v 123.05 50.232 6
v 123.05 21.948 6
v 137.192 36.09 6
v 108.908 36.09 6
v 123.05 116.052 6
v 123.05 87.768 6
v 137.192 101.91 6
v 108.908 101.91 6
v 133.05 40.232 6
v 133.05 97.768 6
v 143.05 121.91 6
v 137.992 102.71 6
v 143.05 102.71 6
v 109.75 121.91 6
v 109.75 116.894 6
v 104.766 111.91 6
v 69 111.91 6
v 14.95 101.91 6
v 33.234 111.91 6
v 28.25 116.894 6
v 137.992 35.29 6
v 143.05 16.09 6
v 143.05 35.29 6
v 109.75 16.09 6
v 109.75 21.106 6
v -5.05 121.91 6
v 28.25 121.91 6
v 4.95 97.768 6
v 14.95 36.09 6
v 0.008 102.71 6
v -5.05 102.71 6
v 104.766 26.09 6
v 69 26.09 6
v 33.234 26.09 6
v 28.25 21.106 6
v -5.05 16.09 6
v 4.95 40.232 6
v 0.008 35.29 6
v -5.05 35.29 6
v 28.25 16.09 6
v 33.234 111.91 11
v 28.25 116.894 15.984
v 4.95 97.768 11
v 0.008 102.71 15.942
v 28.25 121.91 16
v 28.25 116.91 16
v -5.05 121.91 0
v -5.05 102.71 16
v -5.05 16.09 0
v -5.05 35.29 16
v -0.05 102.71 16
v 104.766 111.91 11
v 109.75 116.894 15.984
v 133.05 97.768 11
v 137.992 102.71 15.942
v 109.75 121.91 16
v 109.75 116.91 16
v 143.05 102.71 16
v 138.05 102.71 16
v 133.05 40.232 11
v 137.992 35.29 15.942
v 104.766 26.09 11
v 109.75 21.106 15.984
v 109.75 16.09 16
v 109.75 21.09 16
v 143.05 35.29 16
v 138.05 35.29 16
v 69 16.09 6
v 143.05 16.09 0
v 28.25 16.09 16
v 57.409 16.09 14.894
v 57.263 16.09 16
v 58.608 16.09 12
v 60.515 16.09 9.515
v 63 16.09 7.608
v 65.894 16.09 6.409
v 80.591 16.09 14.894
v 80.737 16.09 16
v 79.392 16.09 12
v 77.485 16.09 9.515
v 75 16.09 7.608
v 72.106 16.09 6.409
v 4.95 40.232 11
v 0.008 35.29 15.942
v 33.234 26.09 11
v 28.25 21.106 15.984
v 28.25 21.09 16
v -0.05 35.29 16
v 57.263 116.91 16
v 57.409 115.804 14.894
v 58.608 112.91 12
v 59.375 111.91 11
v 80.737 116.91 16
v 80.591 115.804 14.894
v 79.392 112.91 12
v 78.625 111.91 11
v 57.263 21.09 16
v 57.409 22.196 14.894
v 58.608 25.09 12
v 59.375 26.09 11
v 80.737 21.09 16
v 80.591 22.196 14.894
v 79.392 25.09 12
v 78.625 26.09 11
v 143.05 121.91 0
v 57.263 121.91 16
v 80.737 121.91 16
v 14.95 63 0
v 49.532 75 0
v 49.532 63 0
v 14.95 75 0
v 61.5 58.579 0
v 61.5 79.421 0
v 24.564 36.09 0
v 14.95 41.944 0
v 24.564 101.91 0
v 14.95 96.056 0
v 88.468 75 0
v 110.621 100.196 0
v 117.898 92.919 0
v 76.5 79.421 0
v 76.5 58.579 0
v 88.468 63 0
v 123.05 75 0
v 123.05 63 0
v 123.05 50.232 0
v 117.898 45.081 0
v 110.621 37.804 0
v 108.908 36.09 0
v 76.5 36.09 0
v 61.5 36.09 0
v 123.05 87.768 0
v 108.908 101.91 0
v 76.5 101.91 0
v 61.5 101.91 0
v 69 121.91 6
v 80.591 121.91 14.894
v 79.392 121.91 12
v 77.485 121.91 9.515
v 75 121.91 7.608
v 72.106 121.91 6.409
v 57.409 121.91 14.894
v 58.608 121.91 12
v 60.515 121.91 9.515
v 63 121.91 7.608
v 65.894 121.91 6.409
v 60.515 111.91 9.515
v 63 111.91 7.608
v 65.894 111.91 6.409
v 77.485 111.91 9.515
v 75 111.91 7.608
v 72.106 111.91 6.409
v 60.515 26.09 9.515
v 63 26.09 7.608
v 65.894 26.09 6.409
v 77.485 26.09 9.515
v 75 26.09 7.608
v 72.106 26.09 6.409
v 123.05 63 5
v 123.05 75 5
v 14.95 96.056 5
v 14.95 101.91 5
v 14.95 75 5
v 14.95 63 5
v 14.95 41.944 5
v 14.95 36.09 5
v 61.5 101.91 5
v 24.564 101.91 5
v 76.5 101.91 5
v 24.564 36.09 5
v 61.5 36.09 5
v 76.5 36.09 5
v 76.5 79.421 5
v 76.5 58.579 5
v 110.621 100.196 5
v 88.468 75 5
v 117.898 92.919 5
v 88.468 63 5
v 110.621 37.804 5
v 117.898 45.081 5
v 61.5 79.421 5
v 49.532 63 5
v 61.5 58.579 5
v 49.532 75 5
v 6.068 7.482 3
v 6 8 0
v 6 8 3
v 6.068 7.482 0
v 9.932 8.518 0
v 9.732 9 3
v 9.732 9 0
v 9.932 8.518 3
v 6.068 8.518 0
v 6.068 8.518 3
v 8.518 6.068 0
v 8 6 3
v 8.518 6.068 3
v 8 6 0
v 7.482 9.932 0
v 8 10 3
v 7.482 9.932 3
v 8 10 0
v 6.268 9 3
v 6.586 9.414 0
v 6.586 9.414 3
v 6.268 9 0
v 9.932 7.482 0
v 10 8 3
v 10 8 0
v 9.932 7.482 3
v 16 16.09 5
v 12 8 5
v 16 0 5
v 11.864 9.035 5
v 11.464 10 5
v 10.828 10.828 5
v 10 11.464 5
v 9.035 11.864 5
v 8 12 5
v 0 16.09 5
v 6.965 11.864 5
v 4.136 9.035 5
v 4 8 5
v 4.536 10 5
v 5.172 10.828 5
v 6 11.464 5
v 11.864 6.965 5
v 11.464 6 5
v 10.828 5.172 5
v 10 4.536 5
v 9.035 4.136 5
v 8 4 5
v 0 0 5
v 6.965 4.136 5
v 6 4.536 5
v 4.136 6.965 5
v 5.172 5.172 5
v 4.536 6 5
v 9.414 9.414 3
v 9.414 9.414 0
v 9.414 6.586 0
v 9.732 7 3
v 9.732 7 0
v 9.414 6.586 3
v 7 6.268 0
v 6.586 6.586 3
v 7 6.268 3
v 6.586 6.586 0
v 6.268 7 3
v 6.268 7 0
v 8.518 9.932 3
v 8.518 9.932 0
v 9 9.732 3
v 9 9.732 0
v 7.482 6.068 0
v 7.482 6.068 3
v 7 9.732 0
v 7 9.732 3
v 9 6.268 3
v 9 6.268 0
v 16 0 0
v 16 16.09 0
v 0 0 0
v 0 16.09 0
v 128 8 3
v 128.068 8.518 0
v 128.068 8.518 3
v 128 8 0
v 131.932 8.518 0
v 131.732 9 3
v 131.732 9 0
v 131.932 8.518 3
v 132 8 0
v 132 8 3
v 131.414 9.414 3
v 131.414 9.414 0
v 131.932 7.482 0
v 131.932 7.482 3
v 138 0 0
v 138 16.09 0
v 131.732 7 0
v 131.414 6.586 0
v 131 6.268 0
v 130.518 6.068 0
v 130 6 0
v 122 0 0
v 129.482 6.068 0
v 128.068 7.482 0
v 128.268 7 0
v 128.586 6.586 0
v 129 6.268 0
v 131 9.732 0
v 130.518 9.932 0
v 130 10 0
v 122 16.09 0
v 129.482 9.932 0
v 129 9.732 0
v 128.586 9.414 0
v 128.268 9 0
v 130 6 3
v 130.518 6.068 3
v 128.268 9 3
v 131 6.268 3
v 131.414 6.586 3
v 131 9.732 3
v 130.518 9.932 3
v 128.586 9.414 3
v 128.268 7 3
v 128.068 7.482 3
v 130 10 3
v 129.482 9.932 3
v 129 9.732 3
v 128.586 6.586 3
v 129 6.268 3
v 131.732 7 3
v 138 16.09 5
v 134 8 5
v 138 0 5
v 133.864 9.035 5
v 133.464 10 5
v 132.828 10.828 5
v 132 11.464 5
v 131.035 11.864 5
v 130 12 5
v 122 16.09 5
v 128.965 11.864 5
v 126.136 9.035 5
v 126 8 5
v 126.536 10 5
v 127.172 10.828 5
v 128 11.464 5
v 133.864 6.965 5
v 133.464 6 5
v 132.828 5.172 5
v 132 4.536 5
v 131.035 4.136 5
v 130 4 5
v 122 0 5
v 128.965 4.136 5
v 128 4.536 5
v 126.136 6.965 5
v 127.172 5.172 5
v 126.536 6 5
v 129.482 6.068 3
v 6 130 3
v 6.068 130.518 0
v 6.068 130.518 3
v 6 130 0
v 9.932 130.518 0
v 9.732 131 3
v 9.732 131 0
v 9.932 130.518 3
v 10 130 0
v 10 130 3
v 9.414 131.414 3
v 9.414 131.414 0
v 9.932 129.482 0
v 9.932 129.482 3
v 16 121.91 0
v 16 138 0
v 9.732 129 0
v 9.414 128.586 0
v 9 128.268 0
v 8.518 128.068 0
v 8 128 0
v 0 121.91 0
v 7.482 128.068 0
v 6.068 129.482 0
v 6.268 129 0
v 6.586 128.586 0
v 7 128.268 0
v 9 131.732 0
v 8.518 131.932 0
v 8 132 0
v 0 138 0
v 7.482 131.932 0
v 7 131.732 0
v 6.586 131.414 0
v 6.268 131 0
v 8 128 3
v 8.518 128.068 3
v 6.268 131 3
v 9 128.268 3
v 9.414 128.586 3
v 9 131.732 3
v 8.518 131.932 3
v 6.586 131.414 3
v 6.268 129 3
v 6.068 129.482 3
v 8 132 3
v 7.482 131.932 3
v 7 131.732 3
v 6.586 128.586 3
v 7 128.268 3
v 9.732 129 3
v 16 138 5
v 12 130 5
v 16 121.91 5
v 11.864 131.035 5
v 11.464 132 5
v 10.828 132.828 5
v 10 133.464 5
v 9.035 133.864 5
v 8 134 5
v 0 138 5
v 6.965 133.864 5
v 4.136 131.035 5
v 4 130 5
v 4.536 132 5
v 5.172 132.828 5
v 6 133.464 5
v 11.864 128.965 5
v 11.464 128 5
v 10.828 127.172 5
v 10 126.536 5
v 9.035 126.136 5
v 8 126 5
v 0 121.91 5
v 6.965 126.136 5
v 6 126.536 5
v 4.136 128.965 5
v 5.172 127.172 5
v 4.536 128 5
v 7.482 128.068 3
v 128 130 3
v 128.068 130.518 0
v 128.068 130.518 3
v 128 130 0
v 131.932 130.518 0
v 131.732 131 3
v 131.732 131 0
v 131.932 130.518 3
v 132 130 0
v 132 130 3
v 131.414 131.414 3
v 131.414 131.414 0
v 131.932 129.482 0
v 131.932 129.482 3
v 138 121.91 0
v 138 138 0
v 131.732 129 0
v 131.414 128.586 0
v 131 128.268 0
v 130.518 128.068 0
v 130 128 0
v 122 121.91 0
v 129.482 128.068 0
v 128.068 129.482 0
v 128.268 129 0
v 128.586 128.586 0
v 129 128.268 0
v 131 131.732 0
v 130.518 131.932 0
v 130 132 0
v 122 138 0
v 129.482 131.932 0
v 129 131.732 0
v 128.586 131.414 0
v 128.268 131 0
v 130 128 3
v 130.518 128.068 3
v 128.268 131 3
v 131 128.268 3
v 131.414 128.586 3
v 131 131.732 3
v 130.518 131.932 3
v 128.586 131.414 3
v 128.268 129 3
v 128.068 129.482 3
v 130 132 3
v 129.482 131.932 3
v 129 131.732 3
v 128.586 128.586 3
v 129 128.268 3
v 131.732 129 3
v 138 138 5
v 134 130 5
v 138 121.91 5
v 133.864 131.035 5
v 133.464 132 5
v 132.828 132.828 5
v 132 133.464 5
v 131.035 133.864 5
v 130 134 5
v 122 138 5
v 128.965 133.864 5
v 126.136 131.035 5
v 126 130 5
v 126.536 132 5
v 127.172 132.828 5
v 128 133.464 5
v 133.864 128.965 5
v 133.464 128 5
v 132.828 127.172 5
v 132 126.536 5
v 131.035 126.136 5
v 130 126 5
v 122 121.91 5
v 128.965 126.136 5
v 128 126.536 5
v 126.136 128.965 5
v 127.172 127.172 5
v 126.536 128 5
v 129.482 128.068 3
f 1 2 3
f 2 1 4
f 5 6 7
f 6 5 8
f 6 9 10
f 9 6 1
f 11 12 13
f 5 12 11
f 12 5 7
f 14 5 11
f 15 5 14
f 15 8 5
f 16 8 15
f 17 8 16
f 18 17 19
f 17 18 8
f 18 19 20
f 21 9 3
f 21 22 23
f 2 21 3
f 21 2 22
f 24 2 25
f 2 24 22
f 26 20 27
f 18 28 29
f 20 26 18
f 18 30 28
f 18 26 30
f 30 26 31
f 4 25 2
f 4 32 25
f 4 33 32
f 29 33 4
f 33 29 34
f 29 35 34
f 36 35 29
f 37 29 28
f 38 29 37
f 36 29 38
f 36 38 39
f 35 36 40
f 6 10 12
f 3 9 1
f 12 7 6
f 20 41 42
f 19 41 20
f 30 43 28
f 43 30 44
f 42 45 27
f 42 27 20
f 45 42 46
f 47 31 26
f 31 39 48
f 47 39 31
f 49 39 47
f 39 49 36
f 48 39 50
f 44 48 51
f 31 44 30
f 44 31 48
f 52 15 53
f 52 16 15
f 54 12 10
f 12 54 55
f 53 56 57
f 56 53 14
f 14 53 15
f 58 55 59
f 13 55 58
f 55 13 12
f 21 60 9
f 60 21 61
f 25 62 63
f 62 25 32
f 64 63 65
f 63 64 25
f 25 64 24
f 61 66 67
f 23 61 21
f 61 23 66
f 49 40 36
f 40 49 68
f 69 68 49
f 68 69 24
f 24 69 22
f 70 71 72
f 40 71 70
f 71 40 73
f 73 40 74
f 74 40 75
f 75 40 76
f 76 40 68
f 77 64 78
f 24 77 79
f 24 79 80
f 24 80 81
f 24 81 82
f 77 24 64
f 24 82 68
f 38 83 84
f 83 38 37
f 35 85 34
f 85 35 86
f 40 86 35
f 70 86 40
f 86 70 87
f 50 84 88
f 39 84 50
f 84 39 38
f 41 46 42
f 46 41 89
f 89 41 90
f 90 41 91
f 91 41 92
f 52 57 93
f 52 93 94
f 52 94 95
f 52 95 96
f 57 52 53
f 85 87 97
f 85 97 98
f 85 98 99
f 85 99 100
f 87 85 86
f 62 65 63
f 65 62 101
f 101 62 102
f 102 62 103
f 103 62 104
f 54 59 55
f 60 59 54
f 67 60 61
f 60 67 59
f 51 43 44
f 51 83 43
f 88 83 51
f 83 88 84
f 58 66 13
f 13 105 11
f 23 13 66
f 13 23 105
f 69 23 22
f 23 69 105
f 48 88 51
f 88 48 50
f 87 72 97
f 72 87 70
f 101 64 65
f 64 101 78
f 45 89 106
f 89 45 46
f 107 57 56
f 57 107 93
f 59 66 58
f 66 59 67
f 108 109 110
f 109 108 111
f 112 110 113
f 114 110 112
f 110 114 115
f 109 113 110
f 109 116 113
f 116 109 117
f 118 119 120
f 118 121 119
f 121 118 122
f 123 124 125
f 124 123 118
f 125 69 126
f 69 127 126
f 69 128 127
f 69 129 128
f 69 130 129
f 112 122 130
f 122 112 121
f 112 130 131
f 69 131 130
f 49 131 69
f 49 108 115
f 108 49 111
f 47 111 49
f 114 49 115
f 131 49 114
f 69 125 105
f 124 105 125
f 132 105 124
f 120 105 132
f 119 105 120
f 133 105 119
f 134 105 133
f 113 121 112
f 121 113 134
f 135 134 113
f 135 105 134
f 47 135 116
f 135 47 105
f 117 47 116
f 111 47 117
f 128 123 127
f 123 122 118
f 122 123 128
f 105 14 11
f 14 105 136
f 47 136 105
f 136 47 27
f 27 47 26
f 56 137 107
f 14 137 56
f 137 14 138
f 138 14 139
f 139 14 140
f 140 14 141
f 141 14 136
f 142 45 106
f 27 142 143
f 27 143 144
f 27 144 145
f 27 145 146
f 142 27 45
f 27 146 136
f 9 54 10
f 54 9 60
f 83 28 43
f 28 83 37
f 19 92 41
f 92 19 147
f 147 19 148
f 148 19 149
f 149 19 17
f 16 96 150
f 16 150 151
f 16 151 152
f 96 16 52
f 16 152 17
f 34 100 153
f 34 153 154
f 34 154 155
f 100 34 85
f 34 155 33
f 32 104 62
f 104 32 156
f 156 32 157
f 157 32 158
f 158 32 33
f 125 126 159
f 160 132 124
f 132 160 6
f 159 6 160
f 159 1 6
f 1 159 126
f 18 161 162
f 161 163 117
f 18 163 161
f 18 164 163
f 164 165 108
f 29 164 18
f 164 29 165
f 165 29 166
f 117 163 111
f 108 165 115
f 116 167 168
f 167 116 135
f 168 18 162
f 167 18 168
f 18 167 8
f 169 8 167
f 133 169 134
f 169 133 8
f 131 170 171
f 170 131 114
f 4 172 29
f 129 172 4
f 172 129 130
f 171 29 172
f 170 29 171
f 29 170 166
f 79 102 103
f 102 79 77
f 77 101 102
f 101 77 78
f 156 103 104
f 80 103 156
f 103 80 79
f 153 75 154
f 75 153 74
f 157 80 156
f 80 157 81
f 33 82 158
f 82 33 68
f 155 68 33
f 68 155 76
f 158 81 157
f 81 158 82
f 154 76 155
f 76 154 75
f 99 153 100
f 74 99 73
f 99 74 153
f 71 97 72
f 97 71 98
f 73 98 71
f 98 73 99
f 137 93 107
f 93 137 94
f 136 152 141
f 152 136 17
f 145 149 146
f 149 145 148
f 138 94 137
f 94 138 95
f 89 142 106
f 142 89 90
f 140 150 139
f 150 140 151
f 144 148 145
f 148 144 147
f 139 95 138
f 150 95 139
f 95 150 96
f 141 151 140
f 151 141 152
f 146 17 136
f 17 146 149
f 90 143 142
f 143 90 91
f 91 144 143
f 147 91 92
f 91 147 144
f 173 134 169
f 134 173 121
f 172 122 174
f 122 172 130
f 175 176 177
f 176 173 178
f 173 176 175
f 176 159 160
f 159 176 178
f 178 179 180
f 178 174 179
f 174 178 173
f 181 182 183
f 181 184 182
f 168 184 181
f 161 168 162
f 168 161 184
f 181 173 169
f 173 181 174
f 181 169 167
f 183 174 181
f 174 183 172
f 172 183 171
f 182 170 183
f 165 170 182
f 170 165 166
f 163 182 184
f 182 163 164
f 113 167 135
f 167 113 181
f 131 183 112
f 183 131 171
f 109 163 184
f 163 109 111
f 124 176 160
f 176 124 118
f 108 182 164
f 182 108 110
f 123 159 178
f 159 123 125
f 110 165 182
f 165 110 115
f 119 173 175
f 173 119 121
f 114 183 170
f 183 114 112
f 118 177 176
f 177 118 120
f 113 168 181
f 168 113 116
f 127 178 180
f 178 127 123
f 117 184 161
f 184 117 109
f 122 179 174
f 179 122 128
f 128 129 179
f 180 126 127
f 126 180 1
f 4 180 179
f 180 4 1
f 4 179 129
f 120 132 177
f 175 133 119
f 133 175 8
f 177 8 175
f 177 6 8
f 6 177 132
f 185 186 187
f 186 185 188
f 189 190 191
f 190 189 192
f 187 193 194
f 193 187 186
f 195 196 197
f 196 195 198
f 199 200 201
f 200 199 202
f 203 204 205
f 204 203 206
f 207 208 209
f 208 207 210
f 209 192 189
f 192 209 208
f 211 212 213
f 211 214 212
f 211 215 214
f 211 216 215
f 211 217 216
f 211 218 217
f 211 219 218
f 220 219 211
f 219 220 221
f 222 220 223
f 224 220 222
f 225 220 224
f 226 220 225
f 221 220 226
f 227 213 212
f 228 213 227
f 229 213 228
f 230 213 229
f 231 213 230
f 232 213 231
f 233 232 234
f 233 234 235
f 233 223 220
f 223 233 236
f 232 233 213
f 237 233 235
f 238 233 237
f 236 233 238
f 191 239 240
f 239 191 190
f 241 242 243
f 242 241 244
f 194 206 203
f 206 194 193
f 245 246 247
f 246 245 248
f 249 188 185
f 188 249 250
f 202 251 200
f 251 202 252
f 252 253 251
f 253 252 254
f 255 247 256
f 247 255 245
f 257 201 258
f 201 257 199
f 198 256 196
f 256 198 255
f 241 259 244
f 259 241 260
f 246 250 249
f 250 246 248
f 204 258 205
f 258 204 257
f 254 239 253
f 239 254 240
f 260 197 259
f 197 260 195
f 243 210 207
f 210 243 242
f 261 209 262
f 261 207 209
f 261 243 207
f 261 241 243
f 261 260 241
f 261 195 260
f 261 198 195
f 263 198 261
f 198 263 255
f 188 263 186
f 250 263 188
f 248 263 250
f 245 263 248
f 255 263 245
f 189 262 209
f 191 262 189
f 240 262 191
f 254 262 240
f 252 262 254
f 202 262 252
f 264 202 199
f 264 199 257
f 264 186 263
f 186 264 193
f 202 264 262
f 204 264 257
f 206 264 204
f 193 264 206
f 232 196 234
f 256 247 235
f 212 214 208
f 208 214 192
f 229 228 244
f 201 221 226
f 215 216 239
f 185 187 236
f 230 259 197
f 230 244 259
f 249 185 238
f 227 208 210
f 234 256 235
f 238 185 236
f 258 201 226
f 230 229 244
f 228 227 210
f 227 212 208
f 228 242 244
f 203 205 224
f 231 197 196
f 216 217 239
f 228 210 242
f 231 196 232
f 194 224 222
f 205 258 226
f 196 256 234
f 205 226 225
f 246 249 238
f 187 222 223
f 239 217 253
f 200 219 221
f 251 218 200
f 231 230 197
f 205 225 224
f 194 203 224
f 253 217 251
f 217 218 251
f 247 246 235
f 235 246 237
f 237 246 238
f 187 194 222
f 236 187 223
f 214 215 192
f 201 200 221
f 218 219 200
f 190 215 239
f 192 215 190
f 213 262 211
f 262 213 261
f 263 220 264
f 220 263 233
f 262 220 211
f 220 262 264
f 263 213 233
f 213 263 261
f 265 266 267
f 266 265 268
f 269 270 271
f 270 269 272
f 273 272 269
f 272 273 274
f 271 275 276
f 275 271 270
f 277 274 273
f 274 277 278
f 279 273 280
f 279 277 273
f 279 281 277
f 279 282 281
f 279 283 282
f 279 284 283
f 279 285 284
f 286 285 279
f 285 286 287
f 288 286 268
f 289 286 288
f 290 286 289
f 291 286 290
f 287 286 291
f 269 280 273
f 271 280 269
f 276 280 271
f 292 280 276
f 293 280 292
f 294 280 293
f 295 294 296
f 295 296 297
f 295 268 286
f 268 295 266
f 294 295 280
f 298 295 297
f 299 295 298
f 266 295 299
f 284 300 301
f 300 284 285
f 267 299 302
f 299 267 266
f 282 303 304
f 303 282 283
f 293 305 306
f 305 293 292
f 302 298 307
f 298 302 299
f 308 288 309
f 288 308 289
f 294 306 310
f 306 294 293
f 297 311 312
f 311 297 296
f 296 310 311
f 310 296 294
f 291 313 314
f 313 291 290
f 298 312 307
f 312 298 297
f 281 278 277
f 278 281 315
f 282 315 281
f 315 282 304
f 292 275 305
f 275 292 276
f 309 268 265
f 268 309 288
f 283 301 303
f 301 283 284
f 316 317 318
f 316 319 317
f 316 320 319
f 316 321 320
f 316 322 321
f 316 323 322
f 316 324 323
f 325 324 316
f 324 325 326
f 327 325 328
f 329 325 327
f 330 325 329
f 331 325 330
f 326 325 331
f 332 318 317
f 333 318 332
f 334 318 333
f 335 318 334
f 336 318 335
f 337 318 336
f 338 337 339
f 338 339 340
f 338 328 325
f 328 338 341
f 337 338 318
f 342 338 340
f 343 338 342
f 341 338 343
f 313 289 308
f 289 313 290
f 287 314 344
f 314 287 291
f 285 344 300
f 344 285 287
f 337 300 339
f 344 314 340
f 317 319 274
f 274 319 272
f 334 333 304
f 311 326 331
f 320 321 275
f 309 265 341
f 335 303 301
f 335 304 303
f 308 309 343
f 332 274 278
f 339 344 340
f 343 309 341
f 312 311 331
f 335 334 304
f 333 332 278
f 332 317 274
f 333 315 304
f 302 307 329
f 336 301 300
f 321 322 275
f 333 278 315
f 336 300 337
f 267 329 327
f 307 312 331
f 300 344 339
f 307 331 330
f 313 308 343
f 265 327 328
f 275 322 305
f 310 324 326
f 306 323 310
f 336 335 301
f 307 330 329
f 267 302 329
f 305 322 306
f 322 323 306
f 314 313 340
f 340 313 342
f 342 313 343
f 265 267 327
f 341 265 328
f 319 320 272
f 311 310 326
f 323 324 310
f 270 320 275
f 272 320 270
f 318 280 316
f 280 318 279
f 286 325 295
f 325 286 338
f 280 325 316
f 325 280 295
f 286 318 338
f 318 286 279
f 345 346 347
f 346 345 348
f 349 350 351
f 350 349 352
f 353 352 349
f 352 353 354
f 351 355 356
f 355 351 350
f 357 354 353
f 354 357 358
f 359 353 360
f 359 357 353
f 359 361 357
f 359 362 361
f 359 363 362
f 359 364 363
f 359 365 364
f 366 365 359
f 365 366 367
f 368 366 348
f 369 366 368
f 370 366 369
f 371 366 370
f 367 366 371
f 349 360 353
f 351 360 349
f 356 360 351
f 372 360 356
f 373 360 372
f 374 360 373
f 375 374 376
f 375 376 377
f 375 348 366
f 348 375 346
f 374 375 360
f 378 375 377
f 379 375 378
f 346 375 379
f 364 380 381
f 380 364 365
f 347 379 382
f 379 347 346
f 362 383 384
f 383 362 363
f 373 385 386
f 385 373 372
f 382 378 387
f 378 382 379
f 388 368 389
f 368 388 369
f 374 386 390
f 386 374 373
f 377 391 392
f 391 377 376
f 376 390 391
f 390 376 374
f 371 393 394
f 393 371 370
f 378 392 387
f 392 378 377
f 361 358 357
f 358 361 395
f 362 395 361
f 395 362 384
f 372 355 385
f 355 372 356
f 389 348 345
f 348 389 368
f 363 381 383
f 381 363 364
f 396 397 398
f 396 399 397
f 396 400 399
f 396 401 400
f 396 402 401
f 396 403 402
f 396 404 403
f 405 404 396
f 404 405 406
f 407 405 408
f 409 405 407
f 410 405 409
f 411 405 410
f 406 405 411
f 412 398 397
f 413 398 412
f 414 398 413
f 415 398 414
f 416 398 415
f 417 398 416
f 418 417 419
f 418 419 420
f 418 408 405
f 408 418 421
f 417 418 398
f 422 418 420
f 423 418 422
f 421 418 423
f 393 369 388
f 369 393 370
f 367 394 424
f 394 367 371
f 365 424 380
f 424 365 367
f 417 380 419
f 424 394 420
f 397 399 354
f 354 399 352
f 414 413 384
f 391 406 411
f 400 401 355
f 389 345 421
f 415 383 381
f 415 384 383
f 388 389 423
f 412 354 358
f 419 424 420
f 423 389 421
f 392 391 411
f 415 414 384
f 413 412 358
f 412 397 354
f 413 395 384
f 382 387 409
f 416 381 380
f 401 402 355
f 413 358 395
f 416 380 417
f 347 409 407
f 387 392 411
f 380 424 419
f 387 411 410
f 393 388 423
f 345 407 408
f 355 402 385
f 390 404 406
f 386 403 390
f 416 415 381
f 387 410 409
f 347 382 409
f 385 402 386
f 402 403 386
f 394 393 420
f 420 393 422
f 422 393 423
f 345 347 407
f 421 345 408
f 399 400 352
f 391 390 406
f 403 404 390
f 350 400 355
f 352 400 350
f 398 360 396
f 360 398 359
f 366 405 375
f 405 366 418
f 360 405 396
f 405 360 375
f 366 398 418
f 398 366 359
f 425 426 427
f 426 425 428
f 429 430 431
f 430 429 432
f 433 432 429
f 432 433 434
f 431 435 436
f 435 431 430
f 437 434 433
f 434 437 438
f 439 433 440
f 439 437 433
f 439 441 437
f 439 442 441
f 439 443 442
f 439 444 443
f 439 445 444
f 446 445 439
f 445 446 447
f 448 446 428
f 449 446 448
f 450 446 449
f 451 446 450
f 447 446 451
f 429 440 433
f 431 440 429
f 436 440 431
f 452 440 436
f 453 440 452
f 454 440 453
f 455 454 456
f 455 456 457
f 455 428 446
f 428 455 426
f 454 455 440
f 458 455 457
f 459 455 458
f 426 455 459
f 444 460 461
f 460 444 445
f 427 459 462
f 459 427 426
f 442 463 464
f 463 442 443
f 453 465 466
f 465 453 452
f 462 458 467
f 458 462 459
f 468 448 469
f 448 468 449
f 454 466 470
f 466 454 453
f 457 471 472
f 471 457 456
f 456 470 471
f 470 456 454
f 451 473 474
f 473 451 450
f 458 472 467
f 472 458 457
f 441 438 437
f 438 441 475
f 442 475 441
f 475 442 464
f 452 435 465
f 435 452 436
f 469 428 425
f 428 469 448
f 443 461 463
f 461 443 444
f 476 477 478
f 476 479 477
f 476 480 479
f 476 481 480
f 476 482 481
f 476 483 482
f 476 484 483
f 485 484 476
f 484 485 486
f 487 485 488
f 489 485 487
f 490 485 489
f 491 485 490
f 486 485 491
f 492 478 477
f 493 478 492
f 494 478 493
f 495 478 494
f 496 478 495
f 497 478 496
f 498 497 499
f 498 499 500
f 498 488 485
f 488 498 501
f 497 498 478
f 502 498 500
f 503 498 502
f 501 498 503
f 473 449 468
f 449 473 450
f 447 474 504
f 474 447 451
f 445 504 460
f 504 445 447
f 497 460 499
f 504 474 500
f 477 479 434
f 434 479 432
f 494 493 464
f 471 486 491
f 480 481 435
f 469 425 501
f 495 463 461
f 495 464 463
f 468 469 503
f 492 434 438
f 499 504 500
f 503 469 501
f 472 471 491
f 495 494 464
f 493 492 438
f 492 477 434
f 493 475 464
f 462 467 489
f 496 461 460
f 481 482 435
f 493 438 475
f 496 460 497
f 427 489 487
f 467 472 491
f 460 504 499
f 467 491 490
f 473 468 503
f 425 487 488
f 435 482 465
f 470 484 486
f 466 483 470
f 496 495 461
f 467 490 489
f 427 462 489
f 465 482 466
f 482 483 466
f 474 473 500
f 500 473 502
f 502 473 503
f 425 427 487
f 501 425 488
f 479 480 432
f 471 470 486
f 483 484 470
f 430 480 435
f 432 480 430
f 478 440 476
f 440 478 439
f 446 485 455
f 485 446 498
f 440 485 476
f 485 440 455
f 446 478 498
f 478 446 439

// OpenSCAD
$fn = 24;
// parameters (mm)

baseLength = 127.76;            // plate length
baseWidth = 85.48;              // plate width
room = .17;

length = baseLength + room*2;   // indentation length
width = baseWidth + room*2;     // indentation width
height = 10;                    // indentation height


// for specific max dimensions: 
// marginX = ([desiredLength] - length) / 2;
// marginY = ([desiredWidth] - width) / 2;
// marginZ = ([desiredHeight] - height);
marginX = 10;            // wall thickness (length)
marginY = 10;            // wall thickness (width)
marginZ = 6;             // base thickness (height)

// to remove a strut set it to 0
lipWidth = 10;          // lip width
strutA = 15;            // - strut width
strutB = 12;            // | strut width
strutX = 10;            // X struts width
strutZ = 5;             // strut thickness

screwMargin = 8;
screwRad = 2;
screwHeadRad = 4;
screwHeadDepth = 2;
screwDistX = 122;
screwDistY = 122;
plateThickness = 5;

// calculations
fullLength = length + marginX * 2;  // full length
fullWidth = width + marginY * 2;    // full width
fullHeight = height + marginZ;    // full height
cutoutLength = length - lipWidth * 2;  // cutout length
cutoutWidth = width - lipWidth * 2;    // cutout width
// diagonal strut length
strutLength = sqrt(cutoutLength*cutoutLength + cutoutWidth*cutoutWidth);
// screw plate dimensions
plateX = screwMargin * 2;
plateY = (screwMargin + (screwDistY - fullWidth) / 2);
offsetX = (screwMargin + (screwDistX - fullLength) / 2);


// Frame
translate([offsetX, plateY, 0]){
    // well plate (remove for printing)
    /*
    translate([marginX + room, marginY + room, marginZ]){
        cube([127.76, 85.48, 5.5]);
        translate([1.5, 1.5, 0]){
            cube([124.76, 82.48, 14.1]); 
        }
    }
    */
    render() difference(){
        // outside block
        cube([fullLength, fullWidth, fullHeight]);
        // indentation
        translate([marginX, marginY, marginZ]){
            cube([length, width, height]);
        }
        // corner cuts
        translate([0, 0, marginZ]){
            rotate([0, 0, 45]){
                translate([-10, -20, 0]){
                    cube([60, 30, height + 2]);
                }
            }
            cube([33.3, 19.2, height + 2]);
            translate([0, fullWidth, 0]){
                rotate([0, 0, -45]){
                    translate([-10, -10, 0]){
                        cube([60, 30, height + 2]);
                    }
                }
                translate([0, -19.2, 0])
                cube([33.3, 19.2, height + 2]);
            }
            translate([fullLength, fullWidth, 0]){
                rotate([0, 0, 225]){
                    translate([-10, -20, 0]){
                        cube([60, 30, height + 2]);
                    }
                }
                translate([-33.3, -19.2, 0])
                cube([33.3, 19.2, height + 2]);
            }
            translate([fullLength, 0, 0]){
                rotate([0, 0, -225]){
                    translate([-10, -10, 0]){
                        cube([60, 30, height + 2]);
                    }
                }
                translate([-33.3, 0, 0])
                cube([33.3, 19.2, height + 2]);
            }
        }
        // cutout bottom
        translate([marginX + lipWidth, marginY + lipWidth, 0]){
            cube([cutoutLength, cutoutWidth, marginZ]);
        }
        // side holes
        translate([fullLength / 2, 0, fullHeight + 2]){
            rotate([-90, 0, 0]){
            cylinder(h = marginY, r = height + 2);
            }
        }
        translate([fullLength / 2, fullWidth, fullHeight + 2]){
            rotate([90, 0, 0]){
            cylinder(h = marginY, r = height + 2);
            }
        }
        // Bevel
        translate([fullLength / 2, fullWidth / 2, fullHeight+ height/2]){
            intersection(){
                rotate([45, 0, 0]){
                    // along x
                    cube([fullLength, fullWidth/sqrt(2), fullWidth/sqrt(2)], true);
                }
                rotate([0, 45, 0]){
                    // along y
                    cube([fullLength/sqrt(2), fullWidth, fullLength/sqrt(2)], true);
                }
                cube([fullLength, fullWidth, height*2], true);
            }
        }
    }
    
    // Struts
    
    // strutA
    // [   ]
    // [---]
    // [   ].
    translate([(fullLength - strutA) / 2, marginY + lipWidth, 0]){
        cube([strutA, cutoutWidth, strutZ]);
    }

    // strutB
    // [ | ]
    // [ | ]
    // [ | ].
    translate([marginX + lipWidth, (fullWidth - strutB) / 2, 0]){
        cube([cutoutLength, strutB, strutZ]);
    }

    // strutX
    // [\  ]
    // [ \ ]
    // [  \].
    translate([(marginX + lipWidth), (marginY + lipWidth), 0]){
        rotate([0, 0, atan2(cutoutWidth, cutoutLength)]){
            translate([0, -strutX / 2, 0]){
                cube([strutLength, strutX, strutZ]);
            }
        }
    }

    // strutX
    // [  /]
    // [ / ]
    // [/  ].
    translate([(marginX + lipWidth), marginY + width - lipWidth, 0]){
        rotate([0, 0, atan2(-cutoutWidth, cutoutLength)]){
            translate([0, -strutX / 2, 0]){
                cube([strutLength, strutX, strutZ]);
            }
        }
    }
    translate([marginX + lipWidth + cutoutLength, marginY + lipWidth, 0]){
        rotate([0, 0, 45]){
            translate([-10, -10, 0]){
                cube([20,20,marginZ]);
            }
        }
    }
    translate([marginX + lipWidth + cutoutLength, marginY + lipWidth + cutoutWidth, 0]){
        rotate([0, 0, 45]){
            translate([-10, -10, 0]){
                cube([20,20,marginZ]);
            }
        }
    }
}

// Screw plates
render() difference(){
    cube([plateX, plateY, plateThickness]);
    translate([screwMargin, screwMargin, 0]){
        cylinder(h = plateThickness, r = screwRad);
        translate([0, 0, plateThickness - screwHeadDepth]){
            cylinder(h = screwHeadDepth, r1 = screwRad, r2 = screwHeadRad);
        }
    }
}
render() difference(){
    translate([screwDistX, 0, 0]){
        cube([plateX, plateY, plateThickness]);
    }
    translate([screwMargin + screwDistX, screwMargin, 0]){
       cylinder(h = plateThickness, r = screwRad);
       translate([0, 0, plateThickness - screwHeadDepth]){
            cylinder(h = screwHeadDepth, r1 = screwRad, r2 = screwHeadRad);
        }
    } 
}
render() difference(){
    translate([0, plateY + fullWidth, 0]){
        cube([plateX, plateY, plateThickness]);
    }
    translate([screwMargin, screwMargin + screwDistY, 0]){
       cylinder(h = plateThickness, r = screwRad);
       translate([0, 0, plateThickness - screwHeadDepth]){
            cylinder(h = screwHeadDepth, r1 = screwRad, r2 = screwHeadRad);
       }
    }
}
render() difference(){
    translate([screwDistX, plateY + fullWidth, 0]){
        cube([plateX, plateY, plateThickness]);
    }
    translate([screwMargin + screwDistX, screwMargin + screwDistY, 0]){
       cylinder(h = plateThickness, r = screwRad);
       translate([0, 0, plateThickness - screwHeadDepth]){
            cylinder(h = screwHeadDepth, r1 = screwRad, r2 = screwHeadRad);
       }
    }
}
